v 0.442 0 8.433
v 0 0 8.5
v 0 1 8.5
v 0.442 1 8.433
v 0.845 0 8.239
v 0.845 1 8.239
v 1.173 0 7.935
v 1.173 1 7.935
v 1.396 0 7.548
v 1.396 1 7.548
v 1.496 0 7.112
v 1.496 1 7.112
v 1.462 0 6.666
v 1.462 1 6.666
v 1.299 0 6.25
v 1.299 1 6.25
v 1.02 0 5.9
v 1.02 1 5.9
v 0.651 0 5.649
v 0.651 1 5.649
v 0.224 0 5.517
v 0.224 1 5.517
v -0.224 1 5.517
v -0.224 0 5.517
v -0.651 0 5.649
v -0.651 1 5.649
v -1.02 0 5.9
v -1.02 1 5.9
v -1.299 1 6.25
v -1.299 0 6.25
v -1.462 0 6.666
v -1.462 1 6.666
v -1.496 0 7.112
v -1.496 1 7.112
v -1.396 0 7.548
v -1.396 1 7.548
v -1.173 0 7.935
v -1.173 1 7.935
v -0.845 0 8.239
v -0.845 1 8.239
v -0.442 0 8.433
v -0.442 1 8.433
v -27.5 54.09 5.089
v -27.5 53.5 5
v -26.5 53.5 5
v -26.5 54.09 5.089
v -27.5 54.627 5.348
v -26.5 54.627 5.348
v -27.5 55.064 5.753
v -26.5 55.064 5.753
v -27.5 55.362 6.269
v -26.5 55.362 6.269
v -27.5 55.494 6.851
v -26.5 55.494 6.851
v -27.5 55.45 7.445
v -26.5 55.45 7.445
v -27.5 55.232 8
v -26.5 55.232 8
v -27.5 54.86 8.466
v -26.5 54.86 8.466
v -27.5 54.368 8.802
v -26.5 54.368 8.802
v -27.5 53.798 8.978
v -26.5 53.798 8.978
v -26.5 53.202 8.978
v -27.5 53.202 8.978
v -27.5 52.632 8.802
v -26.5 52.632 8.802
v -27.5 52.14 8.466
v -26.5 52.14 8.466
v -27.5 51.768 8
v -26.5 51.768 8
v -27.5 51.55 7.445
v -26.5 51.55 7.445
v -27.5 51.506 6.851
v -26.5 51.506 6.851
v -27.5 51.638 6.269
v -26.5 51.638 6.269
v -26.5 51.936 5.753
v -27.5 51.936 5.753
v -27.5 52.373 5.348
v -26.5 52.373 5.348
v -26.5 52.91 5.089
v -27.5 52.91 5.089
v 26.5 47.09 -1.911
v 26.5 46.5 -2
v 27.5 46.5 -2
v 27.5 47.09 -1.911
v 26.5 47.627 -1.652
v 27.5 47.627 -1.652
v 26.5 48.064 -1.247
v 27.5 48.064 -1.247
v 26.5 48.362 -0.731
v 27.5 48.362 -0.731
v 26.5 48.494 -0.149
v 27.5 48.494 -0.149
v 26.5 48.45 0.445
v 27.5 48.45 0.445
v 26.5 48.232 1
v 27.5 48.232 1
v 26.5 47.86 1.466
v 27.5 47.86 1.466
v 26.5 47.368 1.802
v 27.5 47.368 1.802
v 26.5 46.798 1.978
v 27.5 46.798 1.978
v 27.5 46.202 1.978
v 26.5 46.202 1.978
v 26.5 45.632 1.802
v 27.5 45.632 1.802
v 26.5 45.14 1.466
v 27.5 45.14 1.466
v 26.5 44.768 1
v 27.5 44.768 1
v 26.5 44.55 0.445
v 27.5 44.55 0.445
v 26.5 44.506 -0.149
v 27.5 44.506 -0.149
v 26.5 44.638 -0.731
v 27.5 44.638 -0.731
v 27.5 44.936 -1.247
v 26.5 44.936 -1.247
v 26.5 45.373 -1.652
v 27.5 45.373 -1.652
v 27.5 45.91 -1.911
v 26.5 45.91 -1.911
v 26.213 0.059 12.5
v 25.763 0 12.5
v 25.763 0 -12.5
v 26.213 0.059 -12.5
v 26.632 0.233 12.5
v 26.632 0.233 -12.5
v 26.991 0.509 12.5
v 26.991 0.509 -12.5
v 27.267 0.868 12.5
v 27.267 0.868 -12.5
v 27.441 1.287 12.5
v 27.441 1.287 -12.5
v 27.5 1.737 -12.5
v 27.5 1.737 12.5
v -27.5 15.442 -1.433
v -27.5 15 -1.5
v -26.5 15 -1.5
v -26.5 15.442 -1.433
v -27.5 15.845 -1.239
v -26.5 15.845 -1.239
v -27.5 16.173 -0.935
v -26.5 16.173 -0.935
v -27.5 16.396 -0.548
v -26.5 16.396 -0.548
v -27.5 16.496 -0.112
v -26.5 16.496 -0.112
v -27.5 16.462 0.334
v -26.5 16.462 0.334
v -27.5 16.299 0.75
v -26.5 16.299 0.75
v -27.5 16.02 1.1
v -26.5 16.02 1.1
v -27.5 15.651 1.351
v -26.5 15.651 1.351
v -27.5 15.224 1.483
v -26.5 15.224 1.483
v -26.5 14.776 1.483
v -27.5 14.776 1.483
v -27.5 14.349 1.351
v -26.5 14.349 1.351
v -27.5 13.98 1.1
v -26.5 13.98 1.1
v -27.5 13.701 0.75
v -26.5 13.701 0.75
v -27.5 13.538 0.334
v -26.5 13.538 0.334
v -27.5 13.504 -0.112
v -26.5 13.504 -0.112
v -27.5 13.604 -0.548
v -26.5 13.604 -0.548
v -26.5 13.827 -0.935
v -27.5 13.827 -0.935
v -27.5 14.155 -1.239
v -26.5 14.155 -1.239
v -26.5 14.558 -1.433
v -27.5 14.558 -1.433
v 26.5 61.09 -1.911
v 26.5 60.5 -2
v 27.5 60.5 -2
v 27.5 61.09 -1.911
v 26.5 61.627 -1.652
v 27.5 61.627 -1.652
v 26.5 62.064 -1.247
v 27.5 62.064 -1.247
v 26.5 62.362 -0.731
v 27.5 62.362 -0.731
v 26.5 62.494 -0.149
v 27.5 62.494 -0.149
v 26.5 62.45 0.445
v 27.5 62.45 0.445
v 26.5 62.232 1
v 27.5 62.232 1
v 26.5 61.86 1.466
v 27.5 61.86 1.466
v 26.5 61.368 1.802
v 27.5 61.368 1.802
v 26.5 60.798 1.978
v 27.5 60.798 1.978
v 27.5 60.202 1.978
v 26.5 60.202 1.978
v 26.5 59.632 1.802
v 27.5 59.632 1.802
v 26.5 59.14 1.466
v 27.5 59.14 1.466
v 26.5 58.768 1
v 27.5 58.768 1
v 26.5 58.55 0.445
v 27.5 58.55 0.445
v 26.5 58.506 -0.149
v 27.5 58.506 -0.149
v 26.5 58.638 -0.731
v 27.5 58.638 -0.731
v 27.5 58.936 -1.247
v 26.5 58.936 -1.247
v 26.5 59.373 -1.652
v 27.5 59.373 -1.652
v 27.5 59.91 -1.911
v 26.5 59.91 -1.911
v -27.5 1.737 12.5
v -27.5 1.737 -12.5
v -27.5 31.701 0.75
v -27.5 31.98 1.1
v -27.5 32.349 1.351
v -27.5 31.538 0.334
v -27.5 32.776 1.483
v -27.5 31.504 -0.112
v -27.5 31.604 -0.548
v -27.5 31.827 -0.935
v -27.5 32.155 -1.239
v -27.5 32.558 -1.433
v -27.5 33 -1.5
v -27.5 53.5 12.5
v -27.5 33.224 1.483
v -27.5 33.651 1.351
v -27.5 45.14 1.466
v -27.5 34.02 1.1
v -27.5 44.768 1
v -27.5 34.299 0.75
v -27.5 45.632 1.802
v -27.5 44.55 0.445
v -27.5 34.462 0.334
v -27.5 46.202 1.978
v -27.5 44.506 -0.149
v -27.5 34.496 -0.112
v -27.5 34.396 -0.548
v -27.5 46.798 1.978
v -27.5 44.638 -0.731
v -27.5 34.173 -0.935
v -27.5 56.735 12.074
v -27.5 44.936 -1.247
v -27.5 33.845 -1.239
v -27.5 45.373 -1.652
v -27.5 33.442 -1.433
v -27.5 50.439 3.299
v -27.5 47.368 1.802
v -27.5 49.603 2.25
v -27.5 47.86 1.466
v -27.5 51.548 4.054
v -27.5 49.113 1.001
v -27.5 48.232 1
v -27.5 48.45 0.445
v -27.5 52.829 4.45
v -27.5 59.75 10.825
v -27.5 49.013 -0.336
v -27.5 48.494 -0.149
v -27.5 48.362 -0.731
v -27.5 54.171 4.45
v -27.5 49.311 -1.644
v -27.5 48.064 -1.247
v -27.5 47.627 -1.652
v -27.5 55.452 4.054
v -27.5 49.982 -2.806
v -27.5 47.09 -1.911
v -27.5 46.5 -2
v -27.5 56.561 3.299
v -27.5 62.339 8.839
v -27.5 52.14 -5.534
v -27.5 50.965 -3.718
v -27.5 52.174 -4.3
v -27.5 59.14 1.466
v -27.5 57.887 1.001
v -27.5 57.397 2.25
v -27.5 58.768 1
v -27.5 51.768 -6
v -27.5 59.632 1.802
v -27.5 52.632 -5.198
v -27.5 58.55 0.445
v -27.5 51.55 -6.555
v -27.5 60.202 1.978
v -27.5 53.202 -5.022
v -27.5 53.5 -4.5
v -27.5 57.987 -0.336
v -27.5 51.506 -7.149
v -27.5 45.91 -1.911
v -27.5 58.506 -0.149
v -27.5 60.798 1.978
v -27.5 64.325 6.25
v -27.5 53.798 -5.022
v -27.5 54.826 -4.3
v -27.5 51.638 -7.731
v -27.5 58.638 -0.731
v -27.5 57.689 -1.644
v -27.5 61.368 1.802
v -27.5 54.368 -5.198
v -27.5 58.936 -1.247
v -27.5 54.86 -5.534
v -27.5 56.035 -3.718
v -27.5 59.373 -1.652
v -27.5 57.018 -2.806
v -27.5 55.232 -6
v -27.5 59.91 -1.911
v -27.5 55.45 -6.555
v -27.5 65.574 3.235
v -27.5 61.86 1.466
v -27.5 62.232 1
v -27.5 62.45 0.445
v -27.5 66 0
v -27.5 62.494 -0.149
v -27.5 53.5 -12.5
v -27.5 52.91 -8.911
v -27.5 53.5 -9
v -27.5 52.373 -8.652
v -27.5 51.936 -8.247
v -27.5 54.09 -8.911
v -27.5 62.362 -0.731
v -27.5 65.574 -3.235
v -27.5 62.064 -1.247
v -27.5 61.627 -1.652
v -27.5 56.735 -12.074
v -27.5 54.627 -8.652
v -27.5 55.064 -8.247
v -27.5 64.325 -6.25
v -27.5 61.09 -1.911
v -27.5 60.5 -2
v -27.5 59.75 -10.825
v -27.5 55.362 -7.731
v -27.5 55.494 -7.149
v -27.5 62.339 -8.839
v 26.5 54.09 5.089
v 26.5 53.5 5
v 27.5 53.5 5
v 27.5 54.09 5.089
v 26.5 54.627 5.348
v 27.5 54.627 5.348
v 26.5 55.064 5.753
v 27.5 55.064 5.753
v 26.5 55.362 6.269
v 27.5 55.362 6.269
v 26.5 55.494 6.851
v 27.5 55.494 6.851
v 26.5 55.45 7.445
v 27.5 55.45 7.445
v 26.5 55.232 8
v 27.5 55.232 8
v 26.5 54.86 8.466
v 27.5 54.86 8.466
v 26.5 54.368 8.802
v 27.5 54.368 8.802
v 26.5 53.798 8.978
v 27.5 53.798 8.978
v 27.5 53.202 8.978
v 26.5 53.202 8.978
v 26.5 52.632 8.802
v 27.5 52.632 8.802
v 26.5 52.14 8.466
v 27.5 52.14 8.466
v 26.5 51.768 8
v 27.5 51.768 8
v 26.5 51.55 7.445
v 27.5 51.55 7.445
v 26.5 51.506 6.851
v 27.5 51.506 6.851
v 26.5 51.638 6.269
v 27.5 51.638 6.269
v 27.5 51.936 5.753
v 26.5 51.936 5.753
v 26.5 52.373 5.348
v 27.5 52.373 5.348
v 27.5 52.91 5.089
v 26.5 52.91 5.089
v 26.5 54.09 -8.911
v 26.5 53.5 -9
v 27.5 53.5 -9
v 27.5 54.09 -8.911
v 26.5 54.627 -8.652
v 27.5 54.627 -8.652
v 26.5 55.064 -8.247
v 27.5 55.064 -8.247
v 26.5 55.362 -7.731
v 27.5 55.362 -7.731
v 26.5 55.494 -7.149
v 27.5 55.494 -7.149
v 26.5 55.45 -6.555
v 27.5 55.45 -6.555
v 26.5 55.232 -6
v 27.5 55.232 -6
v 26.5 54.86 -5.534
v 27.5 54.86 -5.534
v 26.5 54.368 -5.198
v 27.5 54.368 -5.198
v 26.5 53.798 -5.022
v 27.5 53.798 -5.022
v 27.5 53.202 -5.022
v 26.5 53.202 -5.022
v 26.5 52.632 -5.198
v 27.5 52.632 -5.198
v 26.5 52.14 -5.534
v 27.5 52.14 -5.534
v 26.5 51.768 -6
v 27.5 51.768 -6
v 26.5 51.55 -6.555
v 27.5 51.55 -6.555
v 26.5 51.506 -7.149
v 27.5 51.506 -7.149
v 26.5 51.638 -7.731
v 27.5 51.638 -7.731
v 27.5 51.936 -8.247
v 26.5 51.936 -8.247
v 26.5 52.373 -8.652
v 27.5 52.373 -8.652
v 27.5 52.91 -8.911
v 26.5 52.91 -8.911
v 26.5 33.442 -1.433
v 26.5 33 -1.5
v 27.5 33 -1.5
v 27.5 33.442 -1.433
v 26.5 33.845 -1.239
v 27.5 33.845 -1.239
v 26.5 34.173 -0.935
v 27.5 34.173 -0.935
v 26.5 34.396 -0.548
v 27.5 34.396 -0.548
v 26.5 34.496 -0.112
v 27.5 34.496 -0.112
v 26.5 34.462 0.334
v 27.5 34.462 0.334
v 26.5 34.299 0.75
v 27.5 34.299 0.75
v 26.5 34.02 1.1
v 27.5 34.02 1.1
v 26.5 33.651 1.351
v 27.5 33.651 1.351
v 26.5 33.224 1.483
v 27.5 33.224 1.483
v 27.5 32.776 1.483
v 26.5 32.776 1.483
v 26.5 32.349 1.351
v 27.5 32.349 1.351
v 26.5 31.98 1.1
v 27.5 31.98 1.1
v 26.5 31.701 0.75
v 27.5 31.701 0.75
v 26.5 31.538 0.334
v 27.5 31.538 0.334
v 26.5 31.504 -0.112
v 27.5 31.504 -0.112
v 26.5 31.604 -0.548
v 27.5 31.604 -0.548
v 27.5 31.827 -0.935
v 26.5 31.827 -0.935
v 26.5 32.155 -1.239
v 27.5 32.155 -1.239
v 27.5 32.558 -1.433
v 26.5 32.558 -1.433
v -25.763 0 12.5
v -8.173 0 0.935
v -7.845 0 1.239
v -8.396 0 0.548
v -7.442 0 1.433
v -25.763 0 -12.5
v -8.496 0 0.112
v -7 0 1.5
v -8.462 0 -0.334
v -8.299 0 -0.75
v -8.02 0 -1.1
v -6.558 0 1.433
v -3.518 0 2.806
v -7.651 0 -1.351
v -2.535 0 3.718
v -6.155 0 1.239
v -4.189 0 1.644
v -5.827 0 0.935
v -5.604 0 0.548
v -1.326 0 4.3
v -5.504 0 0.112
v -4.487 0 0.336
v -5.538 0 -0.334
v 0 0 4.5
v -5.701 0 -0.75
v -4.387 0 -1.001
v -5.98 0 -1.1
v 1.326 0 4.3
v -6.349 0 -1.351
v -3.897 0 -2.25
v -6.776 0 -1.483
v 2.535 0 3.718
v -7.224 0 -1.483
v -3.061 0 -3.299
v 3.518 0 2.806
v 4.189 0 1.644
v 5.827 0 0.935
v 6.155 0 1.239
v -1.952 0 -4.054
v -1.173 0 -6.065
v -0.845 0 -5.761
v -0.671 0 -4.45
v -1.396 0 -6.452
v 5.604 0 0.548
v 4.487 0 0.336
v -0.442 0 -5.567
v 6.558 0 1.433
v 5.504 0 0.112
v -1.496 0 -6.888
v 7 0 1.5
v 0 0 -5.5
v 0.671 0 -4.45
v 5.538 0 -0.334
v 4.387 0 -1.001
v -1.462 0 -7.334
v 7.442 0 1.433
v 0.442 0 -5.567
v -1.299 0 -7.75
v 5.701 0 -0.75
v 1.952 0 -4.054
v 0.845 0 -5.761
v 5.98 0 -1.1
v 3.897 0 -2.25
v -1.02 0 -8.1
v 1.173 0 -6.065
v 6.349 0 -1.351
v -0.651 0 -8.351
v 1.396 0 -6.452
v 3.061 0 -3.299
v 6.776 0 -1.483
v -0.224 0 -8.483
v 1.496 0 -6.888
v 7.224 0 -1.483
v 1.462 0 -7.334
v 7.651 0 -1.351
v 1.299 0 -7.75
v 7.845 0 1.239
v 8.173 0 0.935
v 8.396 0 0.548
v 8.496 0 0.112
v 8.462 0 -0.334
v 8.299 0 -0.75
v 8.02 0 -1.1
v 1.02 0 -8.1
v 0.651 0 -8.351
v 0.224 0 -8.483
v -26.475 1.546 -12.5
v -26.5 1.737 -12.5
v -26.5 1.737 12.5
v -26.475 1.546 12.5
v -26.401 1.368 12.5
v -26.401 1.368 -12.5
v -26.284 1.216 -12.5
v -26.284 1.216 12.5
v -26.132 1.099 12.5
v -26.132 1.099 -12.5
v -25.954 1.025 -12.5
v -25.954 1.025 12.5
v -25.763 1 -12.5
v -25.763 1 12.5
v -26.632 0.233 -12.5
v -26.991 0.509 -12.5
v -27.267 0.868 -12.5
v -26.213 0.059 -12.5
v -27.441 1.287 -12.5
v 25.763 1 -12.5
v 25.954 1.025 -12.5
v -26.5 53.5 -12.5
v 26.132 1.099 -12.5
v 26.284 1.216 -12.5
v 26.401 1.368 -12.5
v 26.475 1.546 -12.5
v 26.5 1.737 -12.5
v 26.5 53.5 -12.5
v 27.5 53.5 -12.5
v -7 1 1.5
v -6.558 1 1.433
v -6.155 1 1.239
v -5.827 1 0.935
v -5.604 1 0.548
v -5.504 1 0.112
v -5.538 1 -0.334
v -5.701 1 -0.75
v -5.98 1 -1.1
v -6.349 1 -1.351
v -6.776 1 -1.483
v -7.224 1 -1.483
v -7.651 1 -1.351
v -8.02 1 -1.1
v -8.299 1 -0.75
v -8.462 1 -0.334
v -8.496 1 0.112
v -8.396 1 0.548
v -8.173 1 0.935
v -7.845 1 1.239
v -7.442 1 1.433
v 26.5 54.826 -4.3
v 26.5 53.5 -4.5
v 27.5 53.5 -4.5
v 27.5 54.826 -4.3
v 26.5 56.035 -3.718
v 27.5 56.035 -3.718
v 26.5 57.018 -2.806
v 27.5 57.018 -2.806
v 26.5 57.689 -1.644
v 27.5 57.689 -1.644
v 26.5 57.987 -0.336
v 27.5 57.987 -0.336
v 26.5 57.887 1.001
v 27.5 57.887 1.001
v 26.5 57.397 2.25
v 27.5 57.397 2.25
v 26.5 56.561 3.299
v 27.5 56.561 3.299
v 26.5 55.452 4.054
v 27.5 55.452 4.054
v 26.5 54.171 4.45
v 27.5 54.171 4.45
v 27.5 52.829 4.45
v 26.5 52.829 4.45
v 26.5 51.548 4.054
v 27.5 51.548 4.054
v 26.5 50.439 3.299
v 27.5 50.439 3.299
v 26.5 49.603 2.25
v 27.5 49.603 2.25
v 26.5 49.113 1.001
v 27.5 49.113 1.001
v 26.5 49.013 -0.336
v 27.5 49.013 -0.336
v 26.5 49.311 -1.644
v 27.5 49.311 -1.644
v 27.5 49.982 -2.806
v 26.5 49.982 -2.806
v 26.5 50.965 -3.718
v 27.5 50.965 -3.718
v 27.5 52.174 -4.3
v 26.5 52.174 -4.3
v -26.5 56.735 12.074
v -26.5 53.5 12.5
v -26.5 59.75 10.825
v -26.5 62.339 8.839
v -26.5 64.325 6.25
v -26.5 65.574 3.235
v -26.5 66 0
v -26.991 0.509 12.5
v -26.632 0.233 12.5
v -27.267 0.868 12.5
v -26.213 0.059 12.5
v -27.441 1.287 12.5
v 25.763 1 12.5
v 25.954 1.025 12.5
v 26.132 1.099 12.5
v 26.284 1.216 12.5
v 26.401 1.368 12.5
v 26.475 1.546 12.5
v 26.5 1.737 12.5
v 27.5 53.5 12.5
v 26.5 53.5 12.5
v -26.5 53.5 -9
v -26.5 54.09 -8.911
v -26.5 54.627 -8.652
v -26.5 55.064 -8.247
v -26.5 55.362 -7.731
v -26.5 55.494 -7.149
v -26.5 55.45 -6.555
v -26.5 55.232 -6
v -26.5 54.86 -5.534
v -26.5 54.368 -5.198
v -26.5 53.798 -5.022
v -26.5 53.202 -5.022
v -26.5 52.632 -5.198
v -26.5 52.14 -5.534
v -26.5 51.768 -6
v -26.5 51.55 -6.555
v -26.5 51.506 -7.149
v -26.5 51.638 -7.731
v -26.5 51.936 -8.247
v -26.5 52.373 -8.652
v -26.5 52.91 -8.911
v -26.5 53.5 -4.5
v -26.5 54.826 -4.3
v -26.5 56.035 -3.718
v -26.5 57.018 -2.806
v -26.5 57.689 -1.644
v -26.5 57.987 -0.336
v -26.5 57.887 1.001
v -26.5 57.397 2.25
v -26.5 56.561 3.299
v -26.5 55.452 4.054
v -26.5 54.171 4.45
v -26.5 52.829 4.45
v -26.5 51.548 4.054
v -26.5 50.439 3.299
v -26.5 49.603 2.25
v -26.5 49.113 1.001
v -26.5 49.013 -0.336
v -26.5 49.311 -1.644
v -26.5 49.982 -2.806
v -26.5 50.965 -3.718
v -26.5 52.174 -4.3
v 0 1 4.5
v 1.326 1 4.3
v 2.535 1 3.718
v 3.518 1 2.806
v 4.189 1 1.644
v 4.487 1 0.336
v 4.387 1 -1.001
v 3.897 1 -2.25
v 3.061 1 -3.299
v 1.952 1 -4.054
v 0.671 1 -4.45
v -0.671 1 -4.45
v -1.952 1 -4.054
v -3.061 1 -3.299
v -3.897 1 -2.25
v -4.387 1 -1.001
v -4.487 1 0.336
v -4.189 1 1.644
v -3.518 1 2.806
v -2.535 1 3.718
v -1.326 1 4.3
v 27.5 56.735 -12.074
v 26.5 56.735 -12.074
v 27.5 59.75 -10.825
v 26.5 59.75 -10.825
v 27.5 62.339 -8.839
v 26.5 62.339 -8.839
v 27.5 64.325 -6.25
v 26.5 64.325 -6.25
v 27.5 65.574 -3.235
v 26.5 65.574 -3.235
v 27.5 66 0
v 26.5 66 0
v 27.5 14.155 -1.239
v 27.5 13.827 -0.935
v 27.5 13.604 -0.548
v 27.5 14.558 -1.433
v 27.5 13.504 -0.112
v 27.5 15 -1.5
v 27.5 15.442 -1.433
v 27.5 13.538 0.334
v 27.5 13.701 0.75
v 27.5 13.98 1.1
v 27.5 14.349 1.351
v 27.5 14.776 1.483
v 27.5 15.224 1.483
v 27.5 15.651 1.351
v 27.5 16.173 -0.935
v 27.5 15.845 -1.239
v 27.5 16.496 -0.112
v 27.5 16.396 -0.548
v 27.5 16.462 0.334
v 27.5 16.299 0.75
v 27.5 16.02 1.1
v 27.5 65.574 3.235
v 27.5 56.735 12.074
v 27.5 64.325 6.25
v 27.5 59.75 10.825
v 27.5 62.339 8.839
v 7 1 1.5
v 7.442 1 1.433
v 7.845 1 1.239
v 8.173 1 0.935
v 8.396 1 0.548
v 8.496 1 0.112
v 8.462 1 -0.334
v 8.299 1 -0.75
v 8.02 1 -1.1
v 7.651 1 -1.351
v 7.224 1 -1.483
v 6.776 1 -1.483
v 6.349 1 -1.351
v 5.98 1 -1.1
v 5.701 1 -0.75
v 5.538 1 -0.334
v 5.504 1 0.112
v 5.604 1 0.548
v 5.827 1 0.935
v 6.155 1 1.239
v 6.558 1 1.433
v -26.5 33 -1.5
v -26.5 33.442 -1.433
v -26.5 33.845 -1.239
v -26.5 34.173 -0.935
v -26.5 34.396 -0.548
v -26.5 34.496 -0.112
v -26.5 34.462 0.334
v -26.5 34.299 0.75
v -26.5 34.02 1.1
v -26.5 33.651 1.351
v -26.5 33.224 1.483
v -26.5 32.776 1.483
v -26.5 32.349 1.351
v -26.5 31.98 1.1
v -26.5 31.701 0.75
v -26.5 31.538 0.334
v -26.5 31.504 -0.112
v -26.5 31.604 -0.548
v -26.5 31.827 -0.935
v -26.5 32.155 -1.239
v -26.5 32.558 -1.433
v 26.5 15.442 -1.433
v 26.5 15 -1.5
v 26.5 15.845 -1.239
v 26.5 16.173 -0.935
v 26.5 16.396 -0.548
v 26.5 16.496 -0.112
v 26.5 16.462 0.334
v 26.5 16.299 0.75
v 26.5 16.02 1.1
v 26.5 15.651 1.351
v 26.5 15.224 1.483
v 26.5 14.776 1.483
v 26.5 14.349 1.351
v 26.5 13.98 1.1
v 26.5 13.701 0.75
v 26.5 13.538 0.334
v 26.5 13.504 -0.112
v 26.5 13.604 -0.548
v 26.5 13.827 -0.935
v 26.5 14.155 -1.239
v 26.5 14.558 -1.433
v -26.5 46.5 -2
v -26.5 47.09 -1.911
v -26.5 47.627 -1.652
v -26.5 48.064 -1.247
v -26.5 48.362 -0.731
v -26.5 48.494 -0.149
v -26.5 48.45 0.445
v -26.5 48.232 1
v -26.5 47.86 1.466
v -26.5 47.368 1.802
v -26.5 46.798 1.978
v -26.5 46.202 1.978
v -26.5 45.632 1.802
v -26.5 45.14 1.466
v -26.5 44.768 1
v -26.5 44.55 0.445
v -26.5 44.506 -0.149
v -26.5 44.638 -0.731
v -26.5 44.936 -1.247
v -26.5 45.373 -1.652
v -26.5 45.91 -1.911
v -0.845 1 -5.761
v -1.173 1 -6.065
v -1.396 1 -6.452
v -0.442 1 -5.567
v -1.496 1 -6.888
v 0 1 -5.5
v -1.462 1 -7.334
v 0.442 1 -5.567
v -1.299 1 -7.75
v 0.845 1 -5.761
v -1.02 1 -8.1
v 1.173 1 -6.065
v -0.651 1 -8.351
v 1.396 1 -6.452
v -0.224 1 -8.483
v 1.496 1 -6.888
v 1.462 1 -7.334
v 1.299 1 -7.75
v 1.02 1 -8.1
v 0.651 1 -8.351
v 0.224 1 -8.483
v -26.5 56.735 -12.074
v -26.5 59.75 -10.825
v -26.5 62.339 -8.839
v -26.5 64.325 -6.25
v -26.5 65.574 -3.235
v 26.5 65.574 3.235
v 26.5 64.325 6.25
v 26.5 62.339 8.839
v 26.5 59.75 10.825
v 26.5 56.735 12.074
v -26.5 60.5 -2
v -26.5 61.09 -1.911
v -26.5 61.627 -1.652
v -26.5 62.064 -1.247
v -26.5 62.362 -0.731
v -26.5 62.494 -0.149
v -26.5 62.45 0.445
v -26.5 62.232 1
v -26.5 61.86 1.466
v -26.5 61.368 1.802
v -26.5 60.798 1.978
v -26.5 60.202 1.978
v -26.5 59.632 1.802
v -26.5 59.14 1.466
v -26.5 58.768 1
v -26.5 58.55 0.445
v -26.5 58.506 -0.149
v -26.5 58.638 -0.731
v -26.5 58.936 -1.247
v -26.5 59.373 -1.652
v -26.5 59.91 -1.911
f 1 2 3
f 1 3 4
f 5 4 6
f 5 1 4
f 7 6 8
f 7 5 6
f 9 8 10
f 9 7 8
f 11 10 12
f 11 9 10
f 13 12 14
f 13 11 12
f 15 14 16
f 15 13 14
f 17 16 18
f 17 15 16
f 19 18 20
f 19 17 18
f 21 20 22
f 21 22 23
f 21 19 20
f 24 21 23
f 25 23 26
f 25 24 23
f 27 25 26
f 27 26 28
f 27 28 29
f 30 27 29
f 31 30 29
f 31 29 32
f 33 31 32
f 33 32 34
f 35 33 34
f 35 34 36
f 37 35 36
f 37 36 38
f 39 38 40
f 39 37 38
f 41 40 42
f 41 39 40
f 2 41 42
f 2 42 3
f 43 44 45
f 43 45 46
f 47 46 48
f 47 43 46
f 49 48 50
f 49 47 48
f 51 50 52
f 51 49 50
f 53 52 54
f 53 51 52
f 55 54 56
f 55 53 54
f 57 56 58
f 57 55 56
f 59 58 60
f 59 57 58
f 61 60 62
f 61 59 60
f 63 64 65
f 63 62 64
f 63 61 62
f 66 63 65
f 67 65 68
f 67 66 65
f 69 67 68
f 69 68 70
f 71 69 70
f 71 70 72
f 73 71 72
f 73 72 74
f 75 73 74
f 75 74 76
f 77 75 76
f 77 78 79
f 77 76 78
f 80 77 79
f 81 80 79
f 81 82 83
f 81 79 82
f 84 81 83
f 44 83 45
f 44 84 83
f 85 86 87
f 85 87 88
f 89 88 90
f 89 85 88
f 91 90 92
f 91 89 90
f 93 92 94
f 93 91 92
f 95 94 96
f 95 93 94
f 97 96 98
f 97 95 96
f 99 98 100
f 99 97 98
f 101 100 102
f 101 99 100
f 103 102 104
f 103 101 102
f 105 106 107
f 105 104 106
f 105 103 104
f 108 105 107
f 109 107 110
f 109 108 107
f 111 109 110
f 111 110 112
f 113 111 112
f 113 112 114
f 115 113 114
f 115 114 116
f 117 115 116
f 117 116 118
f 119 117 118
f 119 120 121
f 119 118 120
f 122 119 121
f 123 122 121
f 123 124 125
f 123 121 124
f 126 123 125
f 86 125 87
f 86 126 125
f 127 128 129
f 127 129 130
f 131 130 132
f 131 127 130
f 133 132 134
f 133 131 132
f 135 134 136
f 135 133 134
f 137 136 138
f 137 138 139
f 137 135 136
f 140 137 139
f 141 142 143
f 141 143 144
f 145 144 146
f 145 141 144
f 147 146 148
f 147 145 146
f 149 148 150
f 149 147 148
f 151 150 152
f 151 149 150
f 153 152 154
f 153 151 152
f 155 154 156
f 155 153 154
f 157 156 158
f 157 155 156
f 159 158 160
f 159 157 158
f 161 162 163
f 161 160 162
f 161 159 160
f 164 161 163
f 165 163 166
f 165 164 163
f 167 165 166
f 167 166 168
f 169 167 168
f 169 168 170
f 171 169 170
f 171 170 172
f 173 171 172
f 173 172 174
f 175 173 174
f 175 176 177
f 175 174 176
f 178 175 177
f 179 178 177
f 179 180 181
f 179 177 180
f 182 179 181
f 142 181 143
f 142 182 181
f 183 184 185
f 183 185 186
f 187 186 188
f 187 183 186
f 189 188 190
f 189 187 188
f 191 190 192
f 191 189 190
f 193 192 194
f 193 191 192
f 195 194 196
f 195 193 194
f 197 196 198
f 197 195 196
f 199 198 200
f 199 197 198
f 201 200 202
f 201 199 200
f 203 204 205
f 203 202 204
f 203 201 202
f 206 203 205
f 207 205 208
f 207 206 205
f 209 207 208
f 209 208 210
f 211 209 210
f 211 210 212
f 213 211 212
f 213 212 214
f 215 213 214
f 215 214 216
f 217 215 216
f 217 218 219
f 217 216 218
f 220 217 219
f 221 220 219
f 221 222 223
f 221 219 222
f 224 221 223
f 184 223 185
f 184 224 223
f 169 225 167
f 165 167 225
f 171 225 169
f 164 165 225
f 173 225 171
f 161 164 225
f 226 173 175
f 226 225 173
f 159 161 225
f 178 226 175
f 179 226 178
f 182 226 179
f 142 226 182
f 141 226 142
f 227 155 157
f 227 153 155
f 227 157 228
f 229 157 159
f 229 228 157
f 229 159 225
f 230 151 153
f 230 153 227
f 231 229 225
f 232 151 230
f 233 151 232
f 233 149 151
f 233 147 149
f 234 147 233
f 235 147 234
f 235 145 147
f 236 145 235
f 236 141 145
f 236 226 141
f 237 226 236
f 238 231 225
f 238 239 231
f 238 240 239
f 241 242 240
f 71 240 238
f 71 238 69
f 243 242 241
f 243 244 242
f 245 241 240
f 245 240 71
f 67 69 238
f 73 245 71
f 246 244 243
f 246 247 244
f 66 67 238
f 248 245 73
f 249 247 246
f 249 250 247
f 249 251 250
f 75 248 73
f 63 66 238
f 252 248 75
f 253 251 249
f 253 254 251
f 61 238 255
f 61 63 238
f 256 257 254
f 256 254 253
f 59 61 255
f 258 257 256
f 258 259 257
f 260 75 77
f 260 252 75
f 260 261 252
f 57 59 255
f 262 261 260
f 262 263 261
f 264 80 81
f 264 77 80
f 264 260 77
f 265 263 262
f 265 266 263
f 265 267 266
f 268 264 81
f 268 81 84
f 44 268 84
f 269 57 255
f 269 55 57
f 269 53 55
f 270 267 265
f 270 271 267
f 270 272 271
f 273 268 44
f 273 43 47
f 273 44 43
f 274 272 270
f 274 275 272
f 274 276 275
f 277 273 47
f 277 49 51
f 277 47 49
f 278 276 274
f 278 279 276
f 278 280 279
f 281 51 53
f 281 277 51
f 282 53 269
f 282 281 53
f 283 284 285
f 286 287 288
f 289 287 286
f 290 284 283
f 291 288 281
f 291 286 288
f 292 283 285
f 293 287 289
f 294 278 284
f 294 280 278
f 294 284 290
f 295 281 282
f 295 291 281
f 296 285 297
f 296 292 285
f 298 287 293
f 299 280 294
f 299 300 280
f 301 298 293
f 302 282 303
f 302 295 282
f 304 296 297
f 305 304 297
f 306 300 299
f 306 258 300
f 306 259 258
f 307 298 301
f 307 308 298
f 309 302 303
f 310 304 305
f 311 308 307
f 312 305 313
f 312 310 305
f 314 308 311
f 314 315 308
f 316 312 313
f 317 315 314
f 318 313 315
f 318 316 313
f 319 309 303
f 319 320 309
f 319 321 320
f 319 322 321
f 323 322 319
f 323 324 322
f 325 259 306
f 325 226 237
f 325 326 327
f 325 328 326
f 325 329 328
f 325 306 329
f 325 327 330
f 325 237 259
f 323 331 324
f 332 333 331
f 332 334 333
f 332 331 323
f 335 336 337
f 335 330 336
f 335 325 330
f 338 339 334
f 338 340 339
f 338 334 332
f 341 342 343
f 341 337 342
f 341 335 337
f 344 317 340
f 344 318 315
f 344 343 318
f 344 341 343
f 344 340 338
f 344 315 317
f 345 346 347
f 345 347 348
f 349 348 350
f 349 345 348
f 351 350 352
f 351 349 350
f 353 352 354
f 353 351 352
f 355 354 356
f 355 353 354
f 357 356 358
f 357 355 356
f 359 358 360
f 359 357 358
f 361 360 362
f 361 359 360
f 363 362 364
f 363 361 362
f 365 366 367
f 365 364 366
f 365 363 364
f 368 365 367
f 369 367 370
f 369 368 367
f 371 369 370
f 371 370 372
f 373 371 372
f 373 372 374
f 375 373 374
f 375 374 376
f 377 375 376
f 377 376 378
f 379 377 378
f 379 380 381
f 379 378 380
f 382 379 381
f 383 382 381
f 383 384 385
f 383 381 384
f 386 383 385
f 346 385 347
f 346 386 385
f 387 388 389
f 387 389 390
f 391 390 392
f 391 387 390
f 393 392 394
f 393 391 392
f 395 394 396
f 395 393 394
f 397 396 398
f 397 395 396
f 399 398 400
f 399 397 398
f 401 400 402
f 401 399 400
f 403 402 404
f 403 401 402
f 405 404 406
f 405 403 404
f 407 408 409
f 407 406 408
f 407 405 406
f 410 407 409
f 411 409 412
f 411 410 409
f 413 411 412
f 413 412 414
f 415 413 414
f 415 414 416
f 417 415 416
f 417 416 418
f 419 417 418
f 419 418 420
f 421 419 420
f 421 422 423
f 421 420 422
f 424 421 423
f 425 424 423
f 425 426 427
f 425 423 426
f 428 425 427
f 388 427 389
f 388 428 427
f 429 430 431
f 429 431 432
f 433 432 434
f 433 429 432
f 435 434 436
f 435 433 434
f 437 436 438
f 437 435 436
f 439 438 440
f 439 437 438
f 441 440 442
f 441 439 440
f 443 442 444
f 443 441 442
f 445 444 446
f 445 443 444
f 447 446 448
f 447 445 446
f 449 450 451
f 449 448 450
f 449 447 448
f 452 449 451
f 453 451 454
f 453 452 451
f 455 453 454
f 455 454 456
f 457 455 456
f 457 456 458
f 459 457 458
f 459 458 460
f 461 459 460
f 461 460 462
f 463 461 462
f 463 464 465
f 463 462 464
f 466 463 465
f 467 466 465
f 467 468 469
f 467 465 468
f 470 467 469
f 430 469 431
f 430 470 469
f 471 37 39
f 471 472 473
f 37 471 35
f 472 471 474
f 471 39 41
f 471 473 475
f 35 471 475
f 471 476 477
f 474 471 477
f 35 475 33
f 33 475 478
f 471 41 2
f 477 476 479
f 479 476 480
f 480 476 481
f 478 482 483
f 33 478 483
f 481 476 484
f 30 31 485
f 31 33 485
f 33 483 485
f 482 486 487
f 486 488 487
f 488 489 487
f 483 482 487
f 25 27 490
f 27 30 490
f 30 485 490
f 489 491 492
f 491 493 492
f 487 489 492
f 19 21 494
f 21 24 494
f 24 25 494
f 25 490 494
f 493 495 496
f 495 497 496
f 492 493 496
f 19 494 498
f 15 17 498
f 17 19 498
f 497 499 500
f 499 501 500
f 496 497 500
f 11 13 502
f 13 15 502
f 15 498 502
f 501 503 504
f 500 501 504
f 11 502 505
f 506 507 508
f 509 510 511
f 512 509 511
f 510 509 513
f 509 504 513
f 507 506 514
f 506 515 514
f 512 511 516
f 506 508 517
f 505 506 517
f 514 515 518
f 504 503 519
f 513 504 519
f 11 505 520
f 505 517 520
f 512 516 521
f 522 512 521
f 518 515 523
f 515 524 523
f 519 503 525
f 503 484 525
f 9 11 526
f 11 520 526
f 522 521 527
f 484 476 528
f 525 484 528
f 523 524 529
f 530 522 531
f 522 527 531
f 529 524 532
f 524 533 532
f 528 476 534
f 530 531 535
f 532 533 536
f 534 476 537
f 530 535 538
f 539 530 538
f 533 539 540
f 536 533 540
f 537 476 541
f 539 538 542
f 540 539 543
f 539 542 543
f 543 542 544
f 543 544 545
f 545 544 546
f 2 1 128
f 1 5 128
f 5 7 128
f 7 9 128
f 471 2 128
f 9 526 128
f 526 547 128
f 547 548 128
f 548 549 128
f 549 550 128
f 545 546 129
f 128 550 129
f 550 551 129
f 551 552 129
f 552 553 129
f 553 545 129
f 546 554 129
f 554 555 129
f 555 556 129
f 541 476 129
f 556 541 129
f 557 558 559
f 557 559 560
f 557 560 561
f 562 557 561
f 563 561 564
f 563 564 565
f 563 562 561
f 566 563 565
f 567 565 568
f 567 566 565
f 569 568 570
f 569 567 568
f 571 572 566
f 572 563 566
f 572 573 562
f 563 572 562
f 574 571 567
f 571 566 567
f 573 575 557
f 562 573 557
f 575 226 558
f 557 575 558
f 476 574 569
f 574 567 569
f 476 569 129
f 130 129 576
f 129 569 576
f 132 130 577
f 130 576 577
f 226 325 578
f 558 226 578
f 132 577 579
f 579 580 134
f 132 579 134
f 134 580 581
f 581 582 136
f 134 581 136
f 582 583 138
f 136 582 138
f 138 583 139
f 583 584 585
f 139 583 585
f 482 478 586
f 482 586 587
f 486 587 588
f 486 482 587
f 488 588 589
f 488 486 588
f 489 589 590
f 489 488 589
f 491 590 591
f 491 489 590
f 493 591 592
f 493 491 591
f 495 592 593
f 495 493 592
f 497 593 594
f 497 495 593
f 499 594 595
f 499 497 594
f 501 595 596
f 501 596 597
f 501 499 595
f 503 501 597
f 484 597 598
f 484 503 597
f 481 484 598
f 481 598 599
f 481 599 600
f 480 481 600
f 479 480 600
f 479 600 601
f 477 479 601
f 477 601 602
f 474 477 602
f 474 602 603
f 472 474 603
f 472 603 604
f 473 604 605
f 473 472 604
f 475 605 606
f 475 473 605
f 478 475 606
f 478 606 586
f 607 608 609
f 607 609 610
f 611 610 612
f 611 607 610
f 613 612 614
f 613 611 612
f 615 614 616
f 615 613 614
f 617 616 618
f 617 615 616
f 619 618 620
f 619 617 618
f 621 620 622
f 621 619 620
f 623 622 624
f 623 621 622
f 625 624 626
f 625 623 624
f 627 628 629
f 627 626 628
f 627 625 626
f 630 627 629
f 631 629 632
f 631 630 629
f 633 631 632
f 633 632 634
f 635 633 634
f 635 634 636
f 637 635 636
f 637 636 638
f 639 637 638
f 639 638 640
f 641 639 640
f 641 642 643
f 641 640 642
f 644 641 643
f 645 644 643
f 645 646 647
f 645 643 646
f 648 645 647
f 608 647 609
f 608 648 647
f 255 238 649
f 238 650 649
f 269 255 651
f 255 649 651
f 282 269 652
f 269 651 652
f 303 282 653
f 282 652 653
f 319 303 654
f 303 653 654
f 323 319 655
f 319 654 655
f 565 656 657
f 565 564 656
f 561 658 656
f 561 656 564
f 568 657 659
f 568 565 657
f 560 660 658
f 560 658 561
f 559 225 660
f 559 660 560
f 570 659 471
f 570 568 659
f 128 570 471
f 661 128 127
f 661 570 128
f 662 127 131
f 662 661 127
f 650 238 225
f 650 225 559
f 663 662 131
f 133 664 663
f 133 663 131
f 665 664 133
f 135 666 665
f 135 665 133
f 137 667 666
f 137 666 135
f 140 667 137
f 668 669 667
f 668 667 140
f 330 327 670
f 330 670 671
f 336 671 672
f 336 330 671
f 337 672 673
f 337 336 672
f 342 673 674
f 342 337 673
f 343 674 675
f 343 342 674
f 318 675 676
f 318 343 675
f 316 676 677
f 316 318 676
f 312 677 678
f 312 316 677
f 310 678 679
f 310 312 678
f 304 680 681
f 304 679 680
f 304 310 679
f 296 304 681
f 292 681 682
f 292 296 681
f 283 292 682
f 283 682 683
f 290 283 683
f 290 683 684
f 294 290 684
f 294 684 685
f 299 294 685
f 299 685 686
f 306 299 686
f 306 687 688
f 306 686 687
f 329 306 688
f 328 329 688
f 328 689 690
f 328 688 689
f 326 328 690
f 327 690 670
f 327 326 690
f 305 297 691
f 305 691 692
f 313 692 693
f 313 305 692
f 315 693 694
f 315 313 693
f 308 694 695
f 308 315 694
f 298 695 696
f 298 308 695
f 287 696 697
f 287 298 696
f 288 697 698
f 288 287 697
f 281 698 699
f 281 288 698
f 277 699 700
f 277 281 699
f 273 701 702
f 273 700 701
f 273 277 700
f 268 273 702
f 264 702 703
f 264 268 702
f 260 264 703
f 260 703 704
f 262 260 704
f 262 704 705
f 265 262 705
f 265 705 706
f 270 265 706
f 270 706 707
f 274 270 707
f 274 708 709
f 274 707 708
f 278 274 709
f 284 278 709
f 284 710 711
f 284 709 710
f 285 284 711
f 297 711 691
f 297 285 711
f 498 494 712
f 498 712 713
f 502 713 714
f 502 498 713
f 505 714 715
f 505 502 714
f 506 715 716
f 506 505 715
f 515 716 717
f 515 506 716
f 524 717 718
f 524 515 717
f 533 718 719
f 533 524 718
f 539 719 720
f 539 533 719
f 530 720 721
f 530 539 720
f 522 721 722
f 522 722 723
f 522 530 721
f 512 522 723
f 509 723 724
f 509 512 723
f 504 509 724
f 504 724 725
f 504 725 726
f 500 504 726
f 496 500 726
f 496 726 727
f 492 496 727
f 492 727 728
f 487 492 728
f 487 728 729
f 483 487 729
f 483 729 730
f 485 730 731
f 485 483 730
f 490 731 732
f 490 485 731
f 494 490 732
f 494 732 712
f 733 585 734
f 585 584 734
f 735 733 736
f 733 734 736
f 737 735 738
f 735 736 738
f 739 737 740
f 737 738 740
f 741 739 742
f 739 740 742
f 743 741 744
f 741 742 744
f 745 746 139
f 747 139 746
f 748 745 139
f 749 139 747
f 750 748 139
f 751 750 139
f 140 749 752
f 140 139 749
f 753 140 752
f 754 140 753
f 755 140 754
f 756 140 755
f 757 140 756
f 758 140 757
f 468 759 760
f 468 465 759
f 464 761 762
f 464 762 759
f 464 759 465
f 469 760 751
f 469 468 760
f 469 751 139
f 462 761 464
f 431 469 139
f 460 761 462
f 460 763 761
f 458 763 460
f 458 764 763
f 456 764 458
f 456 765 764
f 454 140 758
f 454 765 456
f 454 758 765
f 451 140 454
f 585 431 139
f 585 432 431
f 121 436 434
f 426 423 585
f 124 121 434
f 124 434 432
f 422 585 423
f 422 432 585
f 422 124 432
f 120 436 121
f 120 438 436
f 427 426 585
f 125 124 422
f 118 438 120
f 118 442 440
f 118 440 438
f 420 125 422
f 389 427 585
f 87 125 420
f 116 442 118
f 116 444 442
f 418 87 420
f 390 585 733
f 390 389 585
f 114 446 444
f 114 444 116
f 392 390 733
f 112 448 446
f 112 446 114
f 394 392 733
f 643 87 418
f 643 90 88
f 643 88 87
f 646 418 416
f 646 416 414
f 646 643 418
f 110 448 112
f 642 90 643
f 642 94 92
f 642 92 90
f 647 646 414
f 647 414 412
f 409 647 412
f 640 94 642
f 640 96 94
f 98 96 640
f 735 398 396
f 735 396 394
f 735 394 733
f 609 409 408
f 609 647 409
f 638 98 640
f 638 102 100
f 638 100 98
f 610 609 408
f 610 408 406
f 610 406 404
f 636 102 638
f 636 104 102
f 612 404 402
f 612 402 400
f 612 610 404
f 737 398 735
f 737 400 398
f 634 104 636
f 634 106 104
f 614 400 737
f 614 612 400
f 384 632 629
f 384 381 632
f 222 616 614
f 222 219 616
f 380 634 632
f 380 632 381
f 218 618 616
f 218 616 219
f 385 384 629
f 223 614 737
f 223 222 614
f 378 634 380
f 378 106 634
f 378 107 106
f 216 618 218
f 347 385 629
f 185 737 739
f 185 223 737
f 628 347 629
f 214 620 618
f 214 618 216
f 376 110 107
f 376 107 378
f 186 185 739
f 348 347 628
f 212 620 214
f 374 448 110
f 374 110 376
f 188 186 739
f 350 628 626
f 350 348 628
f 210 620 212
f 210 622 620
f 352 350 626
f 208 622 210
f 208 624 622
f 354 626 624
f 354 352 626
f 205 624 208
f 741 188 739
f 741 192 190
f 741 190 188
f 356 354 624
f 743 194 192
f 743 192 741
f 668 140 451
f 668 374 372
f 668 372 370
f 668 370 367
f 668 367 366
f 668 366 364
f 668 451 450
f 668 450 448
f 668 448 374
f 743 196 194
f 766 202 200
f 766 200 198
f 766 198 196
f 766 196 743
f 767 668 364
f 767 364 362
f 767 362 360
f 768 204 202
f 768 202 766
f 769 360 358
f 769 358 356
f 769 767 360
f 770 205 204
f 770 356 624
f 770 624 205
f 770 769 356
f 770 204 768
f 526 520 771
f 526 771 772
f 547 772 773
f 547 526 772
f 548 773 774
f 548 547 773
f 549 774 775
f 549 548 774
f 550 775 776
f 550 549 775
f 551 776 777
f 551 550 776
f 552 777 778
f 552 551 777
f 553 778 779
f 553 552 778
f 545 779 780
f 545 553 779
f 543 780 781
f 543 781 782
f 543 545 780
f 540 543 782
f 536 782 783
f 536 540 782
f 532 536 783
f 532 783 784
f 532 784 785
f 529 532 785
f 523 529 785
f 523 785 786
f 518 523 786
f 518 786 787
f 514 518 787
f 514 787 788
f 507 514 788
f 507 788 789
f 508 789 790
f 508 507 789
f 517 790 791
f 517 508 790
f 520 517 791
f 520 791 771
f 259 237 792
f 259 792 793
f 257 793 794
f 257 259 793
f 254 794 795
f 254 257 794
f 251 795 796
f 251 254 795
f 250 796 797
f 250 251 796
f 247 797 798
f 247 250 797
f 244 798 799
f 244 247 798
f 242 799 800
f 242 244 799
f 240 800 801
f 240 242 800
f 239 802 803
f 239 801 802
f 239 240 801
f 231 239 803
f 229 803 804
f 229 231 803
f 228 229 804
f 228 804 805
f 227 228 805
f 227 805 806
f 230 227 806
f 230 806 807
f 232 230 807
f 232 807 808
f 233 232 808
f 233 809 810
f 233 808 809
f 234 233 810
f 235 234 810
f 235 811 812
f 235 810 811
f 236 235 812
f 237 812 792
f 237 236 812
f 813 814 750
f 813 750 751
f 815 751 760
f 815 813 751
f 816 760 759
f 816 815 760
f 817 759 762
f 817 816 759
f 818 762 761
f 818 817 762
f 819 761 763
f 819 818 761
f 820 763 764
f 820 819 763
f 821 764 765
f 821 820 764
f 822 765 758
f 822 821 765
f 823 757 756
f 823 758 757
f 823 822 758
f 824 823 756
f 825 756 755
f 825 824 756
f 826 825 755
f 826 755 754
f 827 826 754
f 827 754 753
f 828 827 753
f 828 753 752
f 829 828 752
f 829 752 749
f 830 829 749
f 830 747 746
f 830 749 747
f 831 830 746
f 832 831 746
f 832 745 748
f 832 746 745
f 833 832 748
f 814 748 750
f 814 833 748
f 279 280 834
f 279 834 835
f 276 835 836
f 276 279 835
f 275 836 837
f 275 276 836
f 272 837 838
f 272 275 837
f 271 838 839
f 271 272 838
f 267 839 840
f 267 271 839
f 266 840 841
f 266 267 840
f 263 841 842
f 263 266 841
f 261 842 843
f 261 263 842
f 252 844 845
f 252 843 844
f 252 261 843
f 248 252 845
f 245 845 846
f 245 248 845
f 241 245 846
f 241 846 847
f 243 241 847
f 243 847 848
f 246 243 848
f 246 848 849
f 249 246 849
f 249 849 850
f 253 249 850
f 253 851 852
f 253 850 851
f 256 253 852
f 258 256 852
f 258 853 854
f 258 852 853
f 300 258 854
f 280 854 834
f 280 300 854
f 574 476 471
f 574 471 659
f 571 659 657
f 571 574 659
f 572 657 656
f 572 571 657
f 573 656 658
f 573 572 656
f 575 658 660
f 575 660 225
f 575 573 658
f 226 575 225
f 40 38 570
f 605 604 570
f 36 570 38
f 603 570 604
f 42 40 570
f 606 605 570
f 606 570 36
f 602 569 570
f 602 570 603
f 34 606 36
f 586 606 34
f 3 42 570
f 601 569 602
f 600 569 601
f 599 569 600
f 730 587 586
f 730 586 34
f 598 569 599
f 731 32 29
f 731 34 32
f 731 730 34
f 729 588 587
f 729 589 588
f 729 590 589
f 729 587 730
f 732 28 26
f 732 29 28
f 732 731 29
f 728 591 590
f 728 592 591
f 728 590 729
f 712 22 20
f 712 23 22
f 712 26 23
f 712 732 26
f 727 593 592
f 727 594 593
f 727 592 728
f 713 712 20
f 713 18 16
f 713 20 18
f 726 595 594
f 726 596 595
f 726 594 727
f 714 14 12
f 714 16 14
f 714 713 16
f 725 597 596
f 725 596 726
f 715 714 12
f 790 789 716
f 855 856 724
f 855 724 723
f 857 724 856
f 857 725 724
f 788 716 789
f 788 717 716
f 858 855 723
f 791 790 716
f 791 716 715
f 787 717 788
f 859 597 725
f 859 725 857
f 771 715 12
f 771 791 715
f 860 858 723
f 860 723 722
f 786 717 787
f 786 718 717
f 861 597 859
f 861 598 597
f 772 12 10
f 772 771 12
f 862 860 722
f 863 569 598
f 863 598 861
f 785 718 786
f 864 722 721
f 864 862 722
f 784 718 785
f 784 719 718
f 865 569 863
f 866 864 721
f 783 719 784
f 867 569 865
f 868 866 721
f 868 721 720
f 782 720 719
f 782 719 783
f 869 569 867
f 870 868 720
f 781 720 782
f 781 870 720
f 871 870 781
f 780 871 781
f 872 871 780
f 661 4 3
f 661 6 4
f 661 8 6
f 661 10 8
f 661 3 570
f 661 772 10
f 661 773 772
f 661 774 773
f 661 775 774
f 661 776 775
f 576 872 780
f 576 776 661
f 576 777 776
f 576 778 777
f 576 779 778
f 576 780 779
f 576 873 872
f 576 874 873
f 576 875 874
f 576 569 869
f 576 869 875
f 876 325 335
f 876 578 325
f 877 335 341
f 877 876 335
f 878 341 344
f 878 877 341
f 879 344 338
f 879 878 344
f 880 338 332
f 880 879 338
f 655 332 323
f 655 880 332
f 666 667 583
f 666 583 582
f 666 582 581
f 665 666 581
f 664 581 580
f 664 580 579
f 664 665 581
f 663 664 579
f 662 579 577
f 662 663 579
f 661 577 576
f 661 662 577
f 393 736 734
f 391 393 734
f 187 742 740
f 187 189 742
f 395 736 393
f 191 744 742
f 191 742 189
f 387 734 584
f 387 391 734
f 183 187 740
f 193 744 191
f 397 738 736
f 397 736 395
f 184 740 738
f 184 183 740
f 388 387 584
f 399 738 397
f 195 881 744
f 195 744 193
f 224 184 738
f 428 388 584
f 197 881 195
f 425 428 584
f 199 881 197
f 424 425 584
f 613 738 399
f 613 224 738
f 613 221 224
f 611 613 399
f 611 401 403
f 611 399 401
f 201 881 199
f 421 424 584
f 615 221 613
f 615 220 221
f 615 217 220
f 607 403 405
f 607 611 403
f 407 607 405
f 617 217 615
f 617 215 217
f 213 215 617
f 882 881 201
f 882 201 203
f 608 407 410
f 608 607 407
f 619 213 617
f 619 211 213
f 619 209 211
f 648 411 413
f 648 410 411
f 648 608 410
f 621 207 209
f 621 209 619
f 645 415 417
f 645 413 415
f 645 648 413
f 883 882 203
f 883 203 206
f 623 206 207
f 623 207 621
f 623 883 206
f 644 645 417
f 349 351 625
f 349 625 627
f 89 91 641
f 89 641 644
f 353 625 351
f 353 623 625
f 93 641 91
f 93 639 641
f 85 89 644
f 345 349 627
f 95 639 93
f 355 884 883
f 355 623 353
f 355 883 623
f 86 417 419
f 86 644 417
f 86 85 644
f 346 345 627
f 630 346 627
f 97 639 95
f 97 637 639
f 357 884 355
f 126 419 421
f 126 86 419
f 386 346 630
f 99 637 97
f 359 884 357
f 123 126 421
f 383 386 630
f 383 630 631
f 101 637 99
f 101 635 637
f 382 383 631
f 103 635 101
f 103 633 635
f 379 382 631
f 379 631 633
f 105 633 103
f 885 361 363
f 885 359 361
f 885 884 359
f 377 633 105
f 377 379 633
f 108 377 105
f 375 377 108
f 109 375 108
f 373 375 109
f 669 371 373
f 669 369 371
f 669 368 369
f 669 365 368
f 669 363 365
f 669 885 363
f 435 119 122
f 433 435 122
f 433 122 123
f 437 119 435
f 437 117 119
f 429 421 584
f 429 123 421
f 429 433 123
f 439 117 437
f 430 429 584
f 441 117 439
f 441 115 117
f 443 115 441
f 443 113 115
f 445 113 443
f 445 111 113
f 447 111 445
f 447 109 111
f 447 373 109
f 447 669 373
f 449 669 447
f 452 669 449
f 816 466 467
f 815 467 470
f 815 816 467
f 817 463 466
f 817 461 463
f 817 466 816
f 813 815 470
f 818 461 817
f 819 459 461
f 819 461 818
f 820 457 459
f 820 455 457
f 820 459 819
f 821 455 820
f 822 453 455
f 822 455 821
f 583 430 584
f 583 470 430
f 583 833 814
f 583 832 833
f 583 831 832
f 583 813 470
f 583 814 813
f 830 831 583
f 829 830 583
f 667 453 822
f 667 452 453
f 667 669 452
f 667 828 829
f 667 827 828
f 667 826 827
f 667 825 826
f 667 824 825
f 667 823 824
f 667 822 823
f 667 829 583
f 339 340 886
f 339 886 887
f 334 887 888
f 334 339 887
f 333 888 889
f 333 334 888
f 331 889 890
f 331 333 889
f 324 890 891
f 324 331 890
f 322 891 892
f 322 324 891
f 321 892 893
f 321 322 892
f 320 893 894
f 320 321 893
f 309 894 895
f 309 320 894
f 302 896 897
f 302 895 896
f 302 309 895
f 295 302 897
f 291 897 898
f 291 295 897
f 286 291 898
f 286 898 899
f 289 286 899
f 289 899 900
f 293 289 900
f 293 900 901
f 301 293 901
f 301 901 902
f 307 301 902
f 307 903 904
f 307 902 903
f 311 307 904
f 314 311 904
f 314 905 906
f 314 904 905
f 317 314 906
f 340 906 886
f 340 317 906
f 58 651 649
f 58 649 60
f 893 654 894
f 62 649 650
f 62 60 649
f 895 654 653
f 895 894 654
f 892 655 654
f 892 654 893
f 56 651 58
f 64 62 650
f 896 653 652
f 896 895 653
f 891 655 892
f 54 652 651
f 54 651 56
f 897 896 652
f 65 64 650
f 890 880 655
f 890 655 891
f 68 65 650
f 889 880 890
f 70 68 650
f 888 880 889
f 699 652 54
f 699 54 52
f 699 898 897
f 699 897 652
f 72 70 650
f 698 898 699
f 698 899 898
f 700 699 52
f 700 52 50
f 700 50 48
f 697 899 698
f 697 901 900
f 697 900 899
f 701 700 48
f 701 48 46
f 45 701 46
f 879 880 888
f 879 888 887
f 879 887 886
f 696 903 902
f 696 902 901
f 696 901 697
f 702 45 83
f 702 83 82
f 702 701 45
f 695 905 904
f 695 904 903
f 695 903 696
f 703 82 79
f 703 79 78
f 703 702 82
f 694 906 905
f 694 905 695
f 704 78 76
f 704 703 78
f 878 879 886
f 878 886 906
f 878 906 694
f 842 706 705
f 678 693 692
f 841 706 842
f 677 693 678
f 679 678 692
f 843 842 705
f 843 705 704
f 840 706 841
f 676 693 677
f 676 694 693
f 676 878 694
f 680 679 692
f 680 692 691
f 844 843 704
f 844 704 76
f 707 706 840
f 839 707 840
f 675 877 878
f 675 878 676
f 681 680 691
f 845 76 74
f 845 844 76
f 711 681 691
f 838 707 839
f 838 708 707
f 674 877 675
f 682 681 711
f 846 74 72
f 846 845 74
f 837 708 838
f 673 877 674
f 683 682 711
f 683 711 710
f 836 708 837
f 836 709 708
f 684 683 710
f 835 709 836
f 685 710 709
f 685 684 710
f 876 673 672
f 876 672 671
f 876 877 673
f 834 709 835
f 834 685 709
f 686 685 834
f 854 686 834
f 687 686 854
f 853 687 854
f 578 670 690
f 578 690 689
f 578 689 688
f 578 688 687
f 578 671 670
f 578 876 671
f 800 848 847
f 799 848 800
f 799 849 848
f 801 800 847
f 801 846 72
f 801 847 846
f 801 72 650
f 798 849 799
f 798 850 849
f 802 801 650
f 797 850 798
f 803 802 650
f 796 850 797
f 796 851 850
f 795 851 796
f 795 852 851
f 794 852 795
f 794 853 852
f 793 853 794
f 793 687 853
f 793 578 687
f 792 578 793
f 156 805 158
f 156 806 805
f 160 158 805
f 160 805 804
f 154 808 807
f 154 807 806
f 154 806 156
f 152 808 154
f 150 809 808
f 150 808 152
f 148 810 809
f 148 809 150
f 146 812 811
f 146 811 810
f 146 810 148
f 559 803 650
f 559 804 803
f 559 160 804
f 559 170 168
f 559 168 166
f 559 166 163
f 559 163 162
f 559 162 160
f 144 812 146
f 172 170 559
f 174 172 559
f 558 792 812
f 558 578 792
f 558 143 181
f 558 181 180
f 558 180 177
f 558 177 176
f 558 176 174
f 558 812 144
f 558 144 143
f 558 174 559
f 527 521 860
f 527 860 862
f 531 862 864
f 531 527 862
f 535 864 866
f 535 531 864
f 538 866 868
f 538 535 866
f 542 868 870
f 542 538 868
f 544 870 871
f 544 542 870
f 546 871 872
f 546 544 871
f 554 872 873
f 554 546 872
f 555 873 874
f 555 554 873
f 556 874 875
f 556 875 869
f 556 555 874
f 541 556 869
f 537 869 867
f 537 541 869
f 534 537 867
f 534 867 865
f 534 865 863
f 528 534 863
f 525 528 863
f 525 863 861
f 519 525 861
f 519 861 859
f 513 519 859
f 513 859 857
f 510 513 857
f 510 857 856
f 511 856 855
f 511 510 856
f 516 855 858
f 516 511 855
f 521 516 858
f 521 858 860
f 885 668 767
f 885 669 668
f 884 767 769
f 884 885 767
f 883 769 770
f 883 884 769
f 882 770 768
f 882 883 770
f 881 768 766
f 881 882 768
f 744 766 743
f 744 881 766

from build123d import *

# Parameters (mm, degrees)
SKETCH1_W                      = 53
SKETCH1_H                      = 25
SKETCH1_R                      = 4.5
SKETCH1_R_2                    = 1.5
BASE_FLANGE1_DEPTH             = 1
EDGE_FLANGE1_STRIP_W           = 5.4732
EDGE_FLANGE1_STRIP_H           = 1
EDGE_FLANGE1_STRIP_CUT_DEPTH   = 25
EDGE_FLANGE1_STRIP_2_W         = 5.4732
EDGE_FLANGE1_STRIP_2_H         = 1
EDGE_FLANGE1_STRIP_CUT_2_DEPTH = 25
EDGE_FLANGE1_DEPTH             = 25
EDGE_FLANGE1_BEND_DEPTH        = 25
CUT_EXTRUDE1_DEPTH             = 73.584433593
CUT_EXTRUDE1_DEPTH_BACK        = 73.584433593
SKETCH13_R                     = 4.5
SKETCH13_R_2                   = 2
SKETCH13_R_3                   = 1.5
FILLET1_R                      = 12.5


# Sheet-metal steps are written as plain solids
with BuildPart() as part:
    # Sketch1 → Base-Flange1 (new body)
    with BuildSketch(Plane(origin=(0, 0, 0), x_dir=(1, 0, 0), z_dir=(0, 1, 0))):
        Rectangle(SKETCH1_W, SKETCH1_H)
        with Locations(Location((0, 0, 0), (0, 0, 270))):
            Circle(SKETCH1_R, mode=Mode.SUBTRACT)
        with Locations(Location((-7, 0, 0), (0, 0, 270))):
            Circle(SKETCH1_R_2, mode=Mode.SUBTRACT)
        with Locations(Location((7, 0, 0), (0, 0, 270))):
            Circle(SKETCH1_R_2, mode=Mode.SUBTRACT)
        with Locations(Location((0, 7, 0), (0, 0, 270))):
            Circle(SKETCH1_R_2, mode=Mode.SUBTRACT)
        with Locations(Location((0, -7, 0), (0, 0, 270))):
            Circle(SKETCH1_R_2, mode=Mode.SUBTRACT)
    extrude(amount=BASE_FLANGE1_DEPTH)

    # Edge-Flange1 strip (across the edge) → Edge-Flange1 strip cut (cut)
    with BuildSketch(Plane(origin=(-26.5, 1, -12.5), x_dir=(1, 0, 0), z_dir=(0, 0, 1))):
        with Locations((-2, -0.5)):
            Rectangle(EDGE_FLANGE1_STRIP_W, EDGE_FLANGE1_STRIP_H)
    extrude(amount=EDGE_FLANGE1_STRIP_CUT_DEPTH, mode=Mode.SUBTRACT)

    # Edge-Flange1 strip 2 (across the edge) → Edge-Flange1 strip cut 2 (cut)
    with BuildSketch(Plane(origin=(26.5, 1, 12.5), x_dir=(-1, 0, 0), z_dir=(0, 0, -1))):
        with Locations((-2, -0.5)):
            Rectangle(EDGE_FLANGE1_STRIP_2_W, EDGE_FLANGE1_STRIP_2_H)
    extrude(amount=EDGE_FLANGE1_STRIP_CUT_2_DEPTH, mode=Mode.SUBTRACT)

    # Edge-Flange1 section (across the edge) → Edge-Flange1 (add)
    with BuildSketch(Plane(origin=(-26.5, 1, -12.5), x_dir=(1, 0, 0), z_dir=(0, 0, 1))):
        with BuildLine():
            Line((-1, 0.7366), (-1, 65))
            Line((-1, 65), (0, 65))
            Line((0, 65), (0, 0.7366))
            ThreePointArc((0, 0.7366), (0.215745145, 0.215745145), (0.7366, 0))
            Line((0.7366, 0), (0.7366, -1))
            ThreePointArc((0.7366, -1), (-0.491361636, -0.491361636), (-1, 0.7366))
        make_face()
    extrude(amount=EDGE_FLANGE1_DEPTH)

    # Edge-Flange1 section 2 (across the edge) → Edge-Flange1 bend (add)
    with BuildSketch(Plane(origin=(26.5, 1, 12.5), x_dir=(-1, 0, 0), z_dir=(0, 0, -1))):
        with BuildLine():
            Line((-1, 0.7366), (-1, 65))
            Line((-1, 65), (0, 65))
            Line((0, 65), (0, 0.7366))
            ThreePointArc((0, 0.7366), (0.215745145, 0.215745145), (0.7366, 0))
            Line((0.7366, 0), (0.7366, -1))
            ThreePointArc((0.7366, -1), (-0.491361636, -0.491361636), (-1, 0.7366))
        make_face()
    extrude(amount=EDGE_FLANGE1_BEND_DEPTH)

    # Sketch13 → Cut-Extrude1 (cut, two sides: drawn at the far end of the back side and taken through both)
    with BuildSketch(Plane(origin=(0, 0, 0), x_dir=(0, 0, -1), z_dir=(1, 0, 0)).offset(-CUT_EXTRUDE1_DEPTH_BACK)):
        with Locations((0, 53.5)):
            Circle(SKETCH13_R)
        with Locations((-7, 53.5)):
            Circle(SKETCH13_R_2)
        with Locations((7, 53.5)):
            Circle(SKETCH13_R_2)
        with Locations((0, 46.5)):
            Circle(SKETCH13_R_2)
        with Locations((0, 60.5)):
            Circle(SKETCH13_R_2)
        with Locations((0, 33)):
            Circle(SKETCH13_R_3)
        with Locations((0, 15)):
            Circle(SKETCH13_R_3)
    extrude(amount=CUT_EXTRUDE1_DEPTH + CUT_EXTRUDE1_DEPTH_BACK, mode=Mode.SUBTRACT)

    # Fillet1
    fillet1_edges = [part.edges().sort_by_distance(p)[0] for p in [
        (-27, 66, -12.5),
        (-27, 66, 12.5),
        (27, 66, -12.5),
        (27, 66, 12.5),
    ]]
    fillet(fillet1_edges, radius=FILLET1_R - 0.0001)  # a hair under: the kernel refuses the full size


solid = part.part
